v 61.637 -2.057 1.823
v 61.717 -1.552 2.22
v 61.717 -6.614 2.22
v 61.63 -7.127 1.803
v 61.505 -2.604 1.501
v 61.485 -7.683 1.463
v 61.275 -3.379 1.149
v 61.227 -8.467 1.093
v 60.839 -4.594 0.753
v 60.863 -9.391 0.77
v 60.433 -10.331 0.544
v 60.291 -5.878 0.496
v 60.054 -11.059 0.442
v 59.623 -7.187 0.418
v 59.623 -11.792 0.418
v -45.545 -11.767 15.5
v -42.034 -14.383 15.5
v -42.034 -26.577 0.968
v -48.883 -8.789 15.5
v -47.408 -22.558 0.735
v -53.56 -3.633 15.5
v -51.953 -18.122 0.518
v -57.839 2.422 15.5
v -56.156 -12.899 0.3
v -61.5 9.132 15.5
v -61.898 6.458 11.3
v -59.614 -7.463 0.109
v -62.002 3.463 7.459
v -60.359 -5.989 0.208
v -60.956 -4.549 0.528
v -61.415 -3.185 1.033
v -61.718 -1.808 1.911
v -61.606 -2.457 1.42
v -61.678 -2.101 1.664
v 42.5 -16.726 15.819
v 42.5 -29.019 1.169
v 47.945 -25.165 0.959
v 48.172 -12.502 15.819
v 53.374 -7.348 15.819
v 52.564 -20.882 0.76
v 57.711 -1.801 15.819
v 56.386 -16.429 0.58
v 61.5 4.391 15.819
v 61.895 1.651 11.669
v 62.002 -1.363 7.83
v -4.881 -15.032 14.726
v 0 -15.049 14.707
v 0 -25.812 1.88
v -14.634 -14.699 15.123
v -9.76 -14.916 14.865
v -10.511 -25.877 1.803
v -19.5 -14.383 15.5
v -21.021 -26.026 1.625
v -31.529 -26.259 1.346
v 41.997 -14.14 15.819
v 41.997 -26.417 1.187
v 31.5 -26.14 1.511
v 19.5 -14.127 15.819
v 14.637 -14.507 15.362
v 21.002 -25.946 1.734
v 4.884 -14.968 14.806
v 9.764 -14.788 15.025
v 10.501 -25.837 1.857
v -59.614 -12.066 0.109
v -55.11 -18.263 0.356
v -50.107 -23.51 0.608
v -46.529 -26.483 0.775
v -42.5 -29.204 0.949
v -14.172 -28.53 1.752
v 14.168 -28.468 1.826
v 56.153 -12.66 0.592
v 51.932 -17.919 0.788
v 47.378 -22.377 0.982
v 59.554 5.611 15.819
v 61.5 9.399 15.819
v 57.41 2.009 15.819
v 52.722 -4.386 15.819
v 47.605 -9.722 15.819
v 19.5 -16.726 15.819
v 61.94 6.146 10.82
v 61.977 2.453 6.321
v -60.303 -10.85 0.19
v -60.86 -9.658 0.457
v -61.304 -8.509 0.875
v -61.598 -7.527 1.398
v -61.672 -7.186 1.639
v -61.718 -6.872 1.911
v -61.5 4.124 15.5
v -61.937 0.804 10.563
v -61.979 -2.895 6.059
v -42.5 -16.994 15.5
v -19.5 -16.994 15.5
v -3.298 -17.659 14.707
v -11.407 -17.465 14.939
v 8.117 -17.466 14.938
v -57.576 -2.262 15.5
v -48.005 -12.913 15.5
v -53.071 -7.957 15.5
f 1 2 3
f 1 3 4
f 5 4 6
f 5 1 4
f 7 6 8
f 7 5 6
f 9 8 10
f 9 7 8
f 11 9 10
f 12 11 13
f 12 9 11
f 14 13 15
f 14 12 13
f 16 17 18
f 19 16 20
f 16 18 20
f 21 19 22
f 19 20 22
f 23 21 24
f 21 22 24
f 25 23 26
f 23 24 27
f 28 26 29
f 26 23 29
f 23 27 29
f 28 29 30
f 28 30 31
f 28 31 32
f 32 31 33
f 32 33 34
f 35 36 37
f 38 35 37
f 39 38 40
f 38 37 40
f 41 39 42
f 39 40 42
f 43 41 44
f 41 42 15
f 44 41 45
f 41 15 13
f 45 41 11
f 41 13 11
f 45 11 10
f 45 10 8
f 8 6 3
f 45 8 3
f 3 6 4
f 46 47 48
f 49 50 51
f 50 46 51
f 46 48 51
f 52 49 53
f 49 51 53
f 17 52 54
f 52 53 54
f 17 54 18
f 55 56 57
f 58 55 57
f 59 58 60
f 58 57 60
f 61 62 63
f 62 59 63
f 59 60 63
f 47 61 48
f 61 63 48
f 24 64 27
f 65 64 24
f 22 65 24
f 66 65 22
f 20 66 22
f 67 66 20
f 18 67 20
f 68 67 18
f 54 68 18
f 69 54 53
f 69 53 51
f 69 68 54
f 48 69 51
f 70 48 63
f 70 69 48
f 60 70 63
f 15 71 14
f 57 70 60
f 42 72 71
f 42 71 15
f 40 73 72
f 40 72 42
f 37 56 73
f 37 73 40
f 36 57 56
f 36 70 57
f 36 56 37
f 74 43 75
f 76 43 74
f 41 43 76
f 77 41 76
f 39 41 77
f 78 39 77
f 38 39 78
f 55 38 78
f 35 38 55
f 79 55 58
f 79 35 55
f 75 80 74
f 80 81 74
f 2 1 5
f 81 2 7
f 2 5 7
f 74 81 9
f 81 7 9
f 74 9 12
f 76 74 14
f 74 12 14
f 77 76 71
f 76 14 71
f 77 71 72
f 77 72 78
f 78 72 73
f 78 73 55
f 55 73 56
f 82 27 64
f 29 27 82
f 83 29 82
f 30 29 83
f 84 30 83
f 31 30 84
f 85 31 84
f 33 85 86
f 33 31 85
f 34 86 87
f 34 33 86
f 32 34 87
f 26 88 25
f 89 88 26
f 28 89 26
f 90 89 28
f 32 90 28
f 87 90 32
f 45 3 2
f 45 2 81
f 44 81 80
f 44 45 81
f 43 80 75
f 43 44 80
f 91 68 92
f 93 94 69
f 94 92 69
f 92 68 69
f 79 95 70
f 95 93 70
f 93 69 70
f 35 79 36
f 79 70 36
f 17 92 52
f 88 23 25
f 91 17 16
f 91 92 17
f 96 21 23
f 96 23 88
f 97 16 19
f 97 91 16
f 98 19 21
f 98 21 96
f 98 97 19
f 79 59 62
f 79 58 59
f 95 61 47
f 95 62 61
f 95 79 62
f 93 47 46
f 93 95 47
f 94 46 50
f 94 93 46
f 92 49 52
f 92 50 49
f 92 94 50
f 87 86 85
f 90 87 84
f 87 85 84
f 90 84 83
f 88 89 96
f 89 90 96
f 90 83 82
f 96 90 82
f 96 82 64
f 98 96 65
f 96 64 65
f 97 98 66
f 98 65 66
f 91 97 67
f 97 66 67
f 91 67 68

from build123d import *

# Parameters (mm, degrees)
F1_DEPTH      = 40
F1_DEPTH_BACK = 11
F4_DEPTH      = 35
F4_DEPTH_BACK = 27.9057510197
F5_T1_DEPTH   = 14.5743949702
F5_T3_DEPTH   = 14.6258479297


# Not quite as in the source:
# - a fillet or chamfer that OpenCascade refuses, or shapes differently, is made with other operations: its cross-section is extruded or revolved along the edge and cut away or added


with BuildPart() as f1:
    # F0 (on Front) → F1 (new body, two sides)
    with BuildSketch(Plane.XZ) as f1_sk:
        with BuildLine():
            Line((-19.5, 15.5), (-61.5, 15.5))
            ThreePointArc((-61.5, 15.5), (-62.0026261084, 7.75), (-61.5, 0))
            ThreePointArc((-61.5, 0), (-0.0044648026, 1.8801470046), (61.5, 0.319182139))
            ThreePointArc((61.5, 0.319182139), (62.0026261084, 8.069182139), (61.5, 15.819182139))
            Line((61.5, 15.819182139), (19.5, 15.819182139))
            ThreePointArc((19.5, 15.819182139), (0.0077989053, 14.7066639823), (-19.5, 15.5))
        make_face()
    extrude(amount=F1_DEPTH)
    extrude(f1_sk.sketch, amount=-F1_DEPTH_BACK)

    # F3 (on face) → F4 (cut, two sides)
    with BuildSketch(Plane(origin=(0, -8.7376098383, -10.4130779155), x_dir=(1, 0, 0), z_dir=(0, -0.6427876097, -0.7660444431))) as f4_sk:
        with BuildLine():
            Line((41.9965417924, 21), (0, 20.9813332936))
            Line((0, 20.9813332936), (-42.034011751, 20.9813332936))
            ThreePointArc((-42.034011751, 20.9813332936), (-55.2445439017, 11.0585633209), (-64.5, -2.6277822851))
            Line((-64.5, -2.6277822851), (-64.5, -10.626510717))
            Line((-64.5, -10.626510717), (-64.5, -28.2158330083))
            Line((-64.5, -28.2158330083), (0, -28.2158330083))
            Line((0, -28.2158330083), (64.5, -28.2158330083))
            Line((64.5, -28.2158330083), (64.5, -12.4673116952))
            Line((64.5, -12.4673116952), (64.5, -2.6264255467))
            ThreePointArc((64.5, -2.6264255467), (55.2297238243, 11.0740614176), (41.9965417924, 21))
        make_face()
        with BuildLine():
            Line((64.5, 1.9813332936), (64.5, 22.9813332936))
            Line((64.5, 22.9813332936), (64.5, 52.9813332936))
            Line((64.5, 52.9813332936), (-64.5, 52.9813332936))
            Line((-64.5, 52.9813332936), (-64.5, 22.9813332936))
            Line((-64.5, 22.9813332936), (-64.5, 1.9813332936))
            ThreePointArc((-64.5, 1.9813332936), (-55.1354627813, 14.1946752549), (-42.5, 22.9813332936))
            Line((-42.5, 22.9813332936), (42.5, 22.9813332936))
            ThreePointArc((42.5, 22.9813332936), (55.1354627813, 14.1946752549), (64.5, 1.9813332936))
        make_face()
    extrude(amount=-F4_DEPTH, mode=Mode.SUBTRACT)
    extrude(f4_sk.sketch, amount=F4_DEPTH_BACK, mode=Mode.SUBTRACT)

    # F5: fillet of radius 2 on 2 edges, made by hand

    # F5_s2 → F5_t1 (cut)
    with BuildSketch(Plane.XZ.offset(-1.1764499881)):
        with BuildLine():
            ThreePointArc((61.7168527659, 2.2201536136), (61.0312003552, 0.8993903708), (59.6231546265, 0.4177868017))
            ThreePointArc((59.6231546265, 0.4177868017), (60.5615983725, 0.3688853121), (61.5, 0.319182139))
            ThreePointArc((61.5, 0.319182139), (61.6160042169, 1.2688034371), (61.7168527659, 2.2201536136))
        make_face()
    extrude(amount=F5_T1_DEPTH, mode=Mode.SUBTRACT)

    # F5_s4 → F5_t3 (cut)
    with BuildSketch(Plane.XZ.offset(-0.9347638385)):
        with BuildLine():
            ThreePointArc((-59.6137615285, 0.1089088503), (-61.0283512081, 0.5866856233), (-61.7178391039, 1.9110500173))
            ThreePointArc((-61.7178391039, 1.9110500173), (-61.6165778825, 0.9546520415), (-61.5, 0))
            ThreePointArc((-61.5, 0), (-60.5569041472, 0.0548594049), (-59.6137615285, 0.1089088503))
        make_face()
    extrude(amount=F5_T3_DEPTH, mode=Mode.SUBTRACT)


solid = f1.part
